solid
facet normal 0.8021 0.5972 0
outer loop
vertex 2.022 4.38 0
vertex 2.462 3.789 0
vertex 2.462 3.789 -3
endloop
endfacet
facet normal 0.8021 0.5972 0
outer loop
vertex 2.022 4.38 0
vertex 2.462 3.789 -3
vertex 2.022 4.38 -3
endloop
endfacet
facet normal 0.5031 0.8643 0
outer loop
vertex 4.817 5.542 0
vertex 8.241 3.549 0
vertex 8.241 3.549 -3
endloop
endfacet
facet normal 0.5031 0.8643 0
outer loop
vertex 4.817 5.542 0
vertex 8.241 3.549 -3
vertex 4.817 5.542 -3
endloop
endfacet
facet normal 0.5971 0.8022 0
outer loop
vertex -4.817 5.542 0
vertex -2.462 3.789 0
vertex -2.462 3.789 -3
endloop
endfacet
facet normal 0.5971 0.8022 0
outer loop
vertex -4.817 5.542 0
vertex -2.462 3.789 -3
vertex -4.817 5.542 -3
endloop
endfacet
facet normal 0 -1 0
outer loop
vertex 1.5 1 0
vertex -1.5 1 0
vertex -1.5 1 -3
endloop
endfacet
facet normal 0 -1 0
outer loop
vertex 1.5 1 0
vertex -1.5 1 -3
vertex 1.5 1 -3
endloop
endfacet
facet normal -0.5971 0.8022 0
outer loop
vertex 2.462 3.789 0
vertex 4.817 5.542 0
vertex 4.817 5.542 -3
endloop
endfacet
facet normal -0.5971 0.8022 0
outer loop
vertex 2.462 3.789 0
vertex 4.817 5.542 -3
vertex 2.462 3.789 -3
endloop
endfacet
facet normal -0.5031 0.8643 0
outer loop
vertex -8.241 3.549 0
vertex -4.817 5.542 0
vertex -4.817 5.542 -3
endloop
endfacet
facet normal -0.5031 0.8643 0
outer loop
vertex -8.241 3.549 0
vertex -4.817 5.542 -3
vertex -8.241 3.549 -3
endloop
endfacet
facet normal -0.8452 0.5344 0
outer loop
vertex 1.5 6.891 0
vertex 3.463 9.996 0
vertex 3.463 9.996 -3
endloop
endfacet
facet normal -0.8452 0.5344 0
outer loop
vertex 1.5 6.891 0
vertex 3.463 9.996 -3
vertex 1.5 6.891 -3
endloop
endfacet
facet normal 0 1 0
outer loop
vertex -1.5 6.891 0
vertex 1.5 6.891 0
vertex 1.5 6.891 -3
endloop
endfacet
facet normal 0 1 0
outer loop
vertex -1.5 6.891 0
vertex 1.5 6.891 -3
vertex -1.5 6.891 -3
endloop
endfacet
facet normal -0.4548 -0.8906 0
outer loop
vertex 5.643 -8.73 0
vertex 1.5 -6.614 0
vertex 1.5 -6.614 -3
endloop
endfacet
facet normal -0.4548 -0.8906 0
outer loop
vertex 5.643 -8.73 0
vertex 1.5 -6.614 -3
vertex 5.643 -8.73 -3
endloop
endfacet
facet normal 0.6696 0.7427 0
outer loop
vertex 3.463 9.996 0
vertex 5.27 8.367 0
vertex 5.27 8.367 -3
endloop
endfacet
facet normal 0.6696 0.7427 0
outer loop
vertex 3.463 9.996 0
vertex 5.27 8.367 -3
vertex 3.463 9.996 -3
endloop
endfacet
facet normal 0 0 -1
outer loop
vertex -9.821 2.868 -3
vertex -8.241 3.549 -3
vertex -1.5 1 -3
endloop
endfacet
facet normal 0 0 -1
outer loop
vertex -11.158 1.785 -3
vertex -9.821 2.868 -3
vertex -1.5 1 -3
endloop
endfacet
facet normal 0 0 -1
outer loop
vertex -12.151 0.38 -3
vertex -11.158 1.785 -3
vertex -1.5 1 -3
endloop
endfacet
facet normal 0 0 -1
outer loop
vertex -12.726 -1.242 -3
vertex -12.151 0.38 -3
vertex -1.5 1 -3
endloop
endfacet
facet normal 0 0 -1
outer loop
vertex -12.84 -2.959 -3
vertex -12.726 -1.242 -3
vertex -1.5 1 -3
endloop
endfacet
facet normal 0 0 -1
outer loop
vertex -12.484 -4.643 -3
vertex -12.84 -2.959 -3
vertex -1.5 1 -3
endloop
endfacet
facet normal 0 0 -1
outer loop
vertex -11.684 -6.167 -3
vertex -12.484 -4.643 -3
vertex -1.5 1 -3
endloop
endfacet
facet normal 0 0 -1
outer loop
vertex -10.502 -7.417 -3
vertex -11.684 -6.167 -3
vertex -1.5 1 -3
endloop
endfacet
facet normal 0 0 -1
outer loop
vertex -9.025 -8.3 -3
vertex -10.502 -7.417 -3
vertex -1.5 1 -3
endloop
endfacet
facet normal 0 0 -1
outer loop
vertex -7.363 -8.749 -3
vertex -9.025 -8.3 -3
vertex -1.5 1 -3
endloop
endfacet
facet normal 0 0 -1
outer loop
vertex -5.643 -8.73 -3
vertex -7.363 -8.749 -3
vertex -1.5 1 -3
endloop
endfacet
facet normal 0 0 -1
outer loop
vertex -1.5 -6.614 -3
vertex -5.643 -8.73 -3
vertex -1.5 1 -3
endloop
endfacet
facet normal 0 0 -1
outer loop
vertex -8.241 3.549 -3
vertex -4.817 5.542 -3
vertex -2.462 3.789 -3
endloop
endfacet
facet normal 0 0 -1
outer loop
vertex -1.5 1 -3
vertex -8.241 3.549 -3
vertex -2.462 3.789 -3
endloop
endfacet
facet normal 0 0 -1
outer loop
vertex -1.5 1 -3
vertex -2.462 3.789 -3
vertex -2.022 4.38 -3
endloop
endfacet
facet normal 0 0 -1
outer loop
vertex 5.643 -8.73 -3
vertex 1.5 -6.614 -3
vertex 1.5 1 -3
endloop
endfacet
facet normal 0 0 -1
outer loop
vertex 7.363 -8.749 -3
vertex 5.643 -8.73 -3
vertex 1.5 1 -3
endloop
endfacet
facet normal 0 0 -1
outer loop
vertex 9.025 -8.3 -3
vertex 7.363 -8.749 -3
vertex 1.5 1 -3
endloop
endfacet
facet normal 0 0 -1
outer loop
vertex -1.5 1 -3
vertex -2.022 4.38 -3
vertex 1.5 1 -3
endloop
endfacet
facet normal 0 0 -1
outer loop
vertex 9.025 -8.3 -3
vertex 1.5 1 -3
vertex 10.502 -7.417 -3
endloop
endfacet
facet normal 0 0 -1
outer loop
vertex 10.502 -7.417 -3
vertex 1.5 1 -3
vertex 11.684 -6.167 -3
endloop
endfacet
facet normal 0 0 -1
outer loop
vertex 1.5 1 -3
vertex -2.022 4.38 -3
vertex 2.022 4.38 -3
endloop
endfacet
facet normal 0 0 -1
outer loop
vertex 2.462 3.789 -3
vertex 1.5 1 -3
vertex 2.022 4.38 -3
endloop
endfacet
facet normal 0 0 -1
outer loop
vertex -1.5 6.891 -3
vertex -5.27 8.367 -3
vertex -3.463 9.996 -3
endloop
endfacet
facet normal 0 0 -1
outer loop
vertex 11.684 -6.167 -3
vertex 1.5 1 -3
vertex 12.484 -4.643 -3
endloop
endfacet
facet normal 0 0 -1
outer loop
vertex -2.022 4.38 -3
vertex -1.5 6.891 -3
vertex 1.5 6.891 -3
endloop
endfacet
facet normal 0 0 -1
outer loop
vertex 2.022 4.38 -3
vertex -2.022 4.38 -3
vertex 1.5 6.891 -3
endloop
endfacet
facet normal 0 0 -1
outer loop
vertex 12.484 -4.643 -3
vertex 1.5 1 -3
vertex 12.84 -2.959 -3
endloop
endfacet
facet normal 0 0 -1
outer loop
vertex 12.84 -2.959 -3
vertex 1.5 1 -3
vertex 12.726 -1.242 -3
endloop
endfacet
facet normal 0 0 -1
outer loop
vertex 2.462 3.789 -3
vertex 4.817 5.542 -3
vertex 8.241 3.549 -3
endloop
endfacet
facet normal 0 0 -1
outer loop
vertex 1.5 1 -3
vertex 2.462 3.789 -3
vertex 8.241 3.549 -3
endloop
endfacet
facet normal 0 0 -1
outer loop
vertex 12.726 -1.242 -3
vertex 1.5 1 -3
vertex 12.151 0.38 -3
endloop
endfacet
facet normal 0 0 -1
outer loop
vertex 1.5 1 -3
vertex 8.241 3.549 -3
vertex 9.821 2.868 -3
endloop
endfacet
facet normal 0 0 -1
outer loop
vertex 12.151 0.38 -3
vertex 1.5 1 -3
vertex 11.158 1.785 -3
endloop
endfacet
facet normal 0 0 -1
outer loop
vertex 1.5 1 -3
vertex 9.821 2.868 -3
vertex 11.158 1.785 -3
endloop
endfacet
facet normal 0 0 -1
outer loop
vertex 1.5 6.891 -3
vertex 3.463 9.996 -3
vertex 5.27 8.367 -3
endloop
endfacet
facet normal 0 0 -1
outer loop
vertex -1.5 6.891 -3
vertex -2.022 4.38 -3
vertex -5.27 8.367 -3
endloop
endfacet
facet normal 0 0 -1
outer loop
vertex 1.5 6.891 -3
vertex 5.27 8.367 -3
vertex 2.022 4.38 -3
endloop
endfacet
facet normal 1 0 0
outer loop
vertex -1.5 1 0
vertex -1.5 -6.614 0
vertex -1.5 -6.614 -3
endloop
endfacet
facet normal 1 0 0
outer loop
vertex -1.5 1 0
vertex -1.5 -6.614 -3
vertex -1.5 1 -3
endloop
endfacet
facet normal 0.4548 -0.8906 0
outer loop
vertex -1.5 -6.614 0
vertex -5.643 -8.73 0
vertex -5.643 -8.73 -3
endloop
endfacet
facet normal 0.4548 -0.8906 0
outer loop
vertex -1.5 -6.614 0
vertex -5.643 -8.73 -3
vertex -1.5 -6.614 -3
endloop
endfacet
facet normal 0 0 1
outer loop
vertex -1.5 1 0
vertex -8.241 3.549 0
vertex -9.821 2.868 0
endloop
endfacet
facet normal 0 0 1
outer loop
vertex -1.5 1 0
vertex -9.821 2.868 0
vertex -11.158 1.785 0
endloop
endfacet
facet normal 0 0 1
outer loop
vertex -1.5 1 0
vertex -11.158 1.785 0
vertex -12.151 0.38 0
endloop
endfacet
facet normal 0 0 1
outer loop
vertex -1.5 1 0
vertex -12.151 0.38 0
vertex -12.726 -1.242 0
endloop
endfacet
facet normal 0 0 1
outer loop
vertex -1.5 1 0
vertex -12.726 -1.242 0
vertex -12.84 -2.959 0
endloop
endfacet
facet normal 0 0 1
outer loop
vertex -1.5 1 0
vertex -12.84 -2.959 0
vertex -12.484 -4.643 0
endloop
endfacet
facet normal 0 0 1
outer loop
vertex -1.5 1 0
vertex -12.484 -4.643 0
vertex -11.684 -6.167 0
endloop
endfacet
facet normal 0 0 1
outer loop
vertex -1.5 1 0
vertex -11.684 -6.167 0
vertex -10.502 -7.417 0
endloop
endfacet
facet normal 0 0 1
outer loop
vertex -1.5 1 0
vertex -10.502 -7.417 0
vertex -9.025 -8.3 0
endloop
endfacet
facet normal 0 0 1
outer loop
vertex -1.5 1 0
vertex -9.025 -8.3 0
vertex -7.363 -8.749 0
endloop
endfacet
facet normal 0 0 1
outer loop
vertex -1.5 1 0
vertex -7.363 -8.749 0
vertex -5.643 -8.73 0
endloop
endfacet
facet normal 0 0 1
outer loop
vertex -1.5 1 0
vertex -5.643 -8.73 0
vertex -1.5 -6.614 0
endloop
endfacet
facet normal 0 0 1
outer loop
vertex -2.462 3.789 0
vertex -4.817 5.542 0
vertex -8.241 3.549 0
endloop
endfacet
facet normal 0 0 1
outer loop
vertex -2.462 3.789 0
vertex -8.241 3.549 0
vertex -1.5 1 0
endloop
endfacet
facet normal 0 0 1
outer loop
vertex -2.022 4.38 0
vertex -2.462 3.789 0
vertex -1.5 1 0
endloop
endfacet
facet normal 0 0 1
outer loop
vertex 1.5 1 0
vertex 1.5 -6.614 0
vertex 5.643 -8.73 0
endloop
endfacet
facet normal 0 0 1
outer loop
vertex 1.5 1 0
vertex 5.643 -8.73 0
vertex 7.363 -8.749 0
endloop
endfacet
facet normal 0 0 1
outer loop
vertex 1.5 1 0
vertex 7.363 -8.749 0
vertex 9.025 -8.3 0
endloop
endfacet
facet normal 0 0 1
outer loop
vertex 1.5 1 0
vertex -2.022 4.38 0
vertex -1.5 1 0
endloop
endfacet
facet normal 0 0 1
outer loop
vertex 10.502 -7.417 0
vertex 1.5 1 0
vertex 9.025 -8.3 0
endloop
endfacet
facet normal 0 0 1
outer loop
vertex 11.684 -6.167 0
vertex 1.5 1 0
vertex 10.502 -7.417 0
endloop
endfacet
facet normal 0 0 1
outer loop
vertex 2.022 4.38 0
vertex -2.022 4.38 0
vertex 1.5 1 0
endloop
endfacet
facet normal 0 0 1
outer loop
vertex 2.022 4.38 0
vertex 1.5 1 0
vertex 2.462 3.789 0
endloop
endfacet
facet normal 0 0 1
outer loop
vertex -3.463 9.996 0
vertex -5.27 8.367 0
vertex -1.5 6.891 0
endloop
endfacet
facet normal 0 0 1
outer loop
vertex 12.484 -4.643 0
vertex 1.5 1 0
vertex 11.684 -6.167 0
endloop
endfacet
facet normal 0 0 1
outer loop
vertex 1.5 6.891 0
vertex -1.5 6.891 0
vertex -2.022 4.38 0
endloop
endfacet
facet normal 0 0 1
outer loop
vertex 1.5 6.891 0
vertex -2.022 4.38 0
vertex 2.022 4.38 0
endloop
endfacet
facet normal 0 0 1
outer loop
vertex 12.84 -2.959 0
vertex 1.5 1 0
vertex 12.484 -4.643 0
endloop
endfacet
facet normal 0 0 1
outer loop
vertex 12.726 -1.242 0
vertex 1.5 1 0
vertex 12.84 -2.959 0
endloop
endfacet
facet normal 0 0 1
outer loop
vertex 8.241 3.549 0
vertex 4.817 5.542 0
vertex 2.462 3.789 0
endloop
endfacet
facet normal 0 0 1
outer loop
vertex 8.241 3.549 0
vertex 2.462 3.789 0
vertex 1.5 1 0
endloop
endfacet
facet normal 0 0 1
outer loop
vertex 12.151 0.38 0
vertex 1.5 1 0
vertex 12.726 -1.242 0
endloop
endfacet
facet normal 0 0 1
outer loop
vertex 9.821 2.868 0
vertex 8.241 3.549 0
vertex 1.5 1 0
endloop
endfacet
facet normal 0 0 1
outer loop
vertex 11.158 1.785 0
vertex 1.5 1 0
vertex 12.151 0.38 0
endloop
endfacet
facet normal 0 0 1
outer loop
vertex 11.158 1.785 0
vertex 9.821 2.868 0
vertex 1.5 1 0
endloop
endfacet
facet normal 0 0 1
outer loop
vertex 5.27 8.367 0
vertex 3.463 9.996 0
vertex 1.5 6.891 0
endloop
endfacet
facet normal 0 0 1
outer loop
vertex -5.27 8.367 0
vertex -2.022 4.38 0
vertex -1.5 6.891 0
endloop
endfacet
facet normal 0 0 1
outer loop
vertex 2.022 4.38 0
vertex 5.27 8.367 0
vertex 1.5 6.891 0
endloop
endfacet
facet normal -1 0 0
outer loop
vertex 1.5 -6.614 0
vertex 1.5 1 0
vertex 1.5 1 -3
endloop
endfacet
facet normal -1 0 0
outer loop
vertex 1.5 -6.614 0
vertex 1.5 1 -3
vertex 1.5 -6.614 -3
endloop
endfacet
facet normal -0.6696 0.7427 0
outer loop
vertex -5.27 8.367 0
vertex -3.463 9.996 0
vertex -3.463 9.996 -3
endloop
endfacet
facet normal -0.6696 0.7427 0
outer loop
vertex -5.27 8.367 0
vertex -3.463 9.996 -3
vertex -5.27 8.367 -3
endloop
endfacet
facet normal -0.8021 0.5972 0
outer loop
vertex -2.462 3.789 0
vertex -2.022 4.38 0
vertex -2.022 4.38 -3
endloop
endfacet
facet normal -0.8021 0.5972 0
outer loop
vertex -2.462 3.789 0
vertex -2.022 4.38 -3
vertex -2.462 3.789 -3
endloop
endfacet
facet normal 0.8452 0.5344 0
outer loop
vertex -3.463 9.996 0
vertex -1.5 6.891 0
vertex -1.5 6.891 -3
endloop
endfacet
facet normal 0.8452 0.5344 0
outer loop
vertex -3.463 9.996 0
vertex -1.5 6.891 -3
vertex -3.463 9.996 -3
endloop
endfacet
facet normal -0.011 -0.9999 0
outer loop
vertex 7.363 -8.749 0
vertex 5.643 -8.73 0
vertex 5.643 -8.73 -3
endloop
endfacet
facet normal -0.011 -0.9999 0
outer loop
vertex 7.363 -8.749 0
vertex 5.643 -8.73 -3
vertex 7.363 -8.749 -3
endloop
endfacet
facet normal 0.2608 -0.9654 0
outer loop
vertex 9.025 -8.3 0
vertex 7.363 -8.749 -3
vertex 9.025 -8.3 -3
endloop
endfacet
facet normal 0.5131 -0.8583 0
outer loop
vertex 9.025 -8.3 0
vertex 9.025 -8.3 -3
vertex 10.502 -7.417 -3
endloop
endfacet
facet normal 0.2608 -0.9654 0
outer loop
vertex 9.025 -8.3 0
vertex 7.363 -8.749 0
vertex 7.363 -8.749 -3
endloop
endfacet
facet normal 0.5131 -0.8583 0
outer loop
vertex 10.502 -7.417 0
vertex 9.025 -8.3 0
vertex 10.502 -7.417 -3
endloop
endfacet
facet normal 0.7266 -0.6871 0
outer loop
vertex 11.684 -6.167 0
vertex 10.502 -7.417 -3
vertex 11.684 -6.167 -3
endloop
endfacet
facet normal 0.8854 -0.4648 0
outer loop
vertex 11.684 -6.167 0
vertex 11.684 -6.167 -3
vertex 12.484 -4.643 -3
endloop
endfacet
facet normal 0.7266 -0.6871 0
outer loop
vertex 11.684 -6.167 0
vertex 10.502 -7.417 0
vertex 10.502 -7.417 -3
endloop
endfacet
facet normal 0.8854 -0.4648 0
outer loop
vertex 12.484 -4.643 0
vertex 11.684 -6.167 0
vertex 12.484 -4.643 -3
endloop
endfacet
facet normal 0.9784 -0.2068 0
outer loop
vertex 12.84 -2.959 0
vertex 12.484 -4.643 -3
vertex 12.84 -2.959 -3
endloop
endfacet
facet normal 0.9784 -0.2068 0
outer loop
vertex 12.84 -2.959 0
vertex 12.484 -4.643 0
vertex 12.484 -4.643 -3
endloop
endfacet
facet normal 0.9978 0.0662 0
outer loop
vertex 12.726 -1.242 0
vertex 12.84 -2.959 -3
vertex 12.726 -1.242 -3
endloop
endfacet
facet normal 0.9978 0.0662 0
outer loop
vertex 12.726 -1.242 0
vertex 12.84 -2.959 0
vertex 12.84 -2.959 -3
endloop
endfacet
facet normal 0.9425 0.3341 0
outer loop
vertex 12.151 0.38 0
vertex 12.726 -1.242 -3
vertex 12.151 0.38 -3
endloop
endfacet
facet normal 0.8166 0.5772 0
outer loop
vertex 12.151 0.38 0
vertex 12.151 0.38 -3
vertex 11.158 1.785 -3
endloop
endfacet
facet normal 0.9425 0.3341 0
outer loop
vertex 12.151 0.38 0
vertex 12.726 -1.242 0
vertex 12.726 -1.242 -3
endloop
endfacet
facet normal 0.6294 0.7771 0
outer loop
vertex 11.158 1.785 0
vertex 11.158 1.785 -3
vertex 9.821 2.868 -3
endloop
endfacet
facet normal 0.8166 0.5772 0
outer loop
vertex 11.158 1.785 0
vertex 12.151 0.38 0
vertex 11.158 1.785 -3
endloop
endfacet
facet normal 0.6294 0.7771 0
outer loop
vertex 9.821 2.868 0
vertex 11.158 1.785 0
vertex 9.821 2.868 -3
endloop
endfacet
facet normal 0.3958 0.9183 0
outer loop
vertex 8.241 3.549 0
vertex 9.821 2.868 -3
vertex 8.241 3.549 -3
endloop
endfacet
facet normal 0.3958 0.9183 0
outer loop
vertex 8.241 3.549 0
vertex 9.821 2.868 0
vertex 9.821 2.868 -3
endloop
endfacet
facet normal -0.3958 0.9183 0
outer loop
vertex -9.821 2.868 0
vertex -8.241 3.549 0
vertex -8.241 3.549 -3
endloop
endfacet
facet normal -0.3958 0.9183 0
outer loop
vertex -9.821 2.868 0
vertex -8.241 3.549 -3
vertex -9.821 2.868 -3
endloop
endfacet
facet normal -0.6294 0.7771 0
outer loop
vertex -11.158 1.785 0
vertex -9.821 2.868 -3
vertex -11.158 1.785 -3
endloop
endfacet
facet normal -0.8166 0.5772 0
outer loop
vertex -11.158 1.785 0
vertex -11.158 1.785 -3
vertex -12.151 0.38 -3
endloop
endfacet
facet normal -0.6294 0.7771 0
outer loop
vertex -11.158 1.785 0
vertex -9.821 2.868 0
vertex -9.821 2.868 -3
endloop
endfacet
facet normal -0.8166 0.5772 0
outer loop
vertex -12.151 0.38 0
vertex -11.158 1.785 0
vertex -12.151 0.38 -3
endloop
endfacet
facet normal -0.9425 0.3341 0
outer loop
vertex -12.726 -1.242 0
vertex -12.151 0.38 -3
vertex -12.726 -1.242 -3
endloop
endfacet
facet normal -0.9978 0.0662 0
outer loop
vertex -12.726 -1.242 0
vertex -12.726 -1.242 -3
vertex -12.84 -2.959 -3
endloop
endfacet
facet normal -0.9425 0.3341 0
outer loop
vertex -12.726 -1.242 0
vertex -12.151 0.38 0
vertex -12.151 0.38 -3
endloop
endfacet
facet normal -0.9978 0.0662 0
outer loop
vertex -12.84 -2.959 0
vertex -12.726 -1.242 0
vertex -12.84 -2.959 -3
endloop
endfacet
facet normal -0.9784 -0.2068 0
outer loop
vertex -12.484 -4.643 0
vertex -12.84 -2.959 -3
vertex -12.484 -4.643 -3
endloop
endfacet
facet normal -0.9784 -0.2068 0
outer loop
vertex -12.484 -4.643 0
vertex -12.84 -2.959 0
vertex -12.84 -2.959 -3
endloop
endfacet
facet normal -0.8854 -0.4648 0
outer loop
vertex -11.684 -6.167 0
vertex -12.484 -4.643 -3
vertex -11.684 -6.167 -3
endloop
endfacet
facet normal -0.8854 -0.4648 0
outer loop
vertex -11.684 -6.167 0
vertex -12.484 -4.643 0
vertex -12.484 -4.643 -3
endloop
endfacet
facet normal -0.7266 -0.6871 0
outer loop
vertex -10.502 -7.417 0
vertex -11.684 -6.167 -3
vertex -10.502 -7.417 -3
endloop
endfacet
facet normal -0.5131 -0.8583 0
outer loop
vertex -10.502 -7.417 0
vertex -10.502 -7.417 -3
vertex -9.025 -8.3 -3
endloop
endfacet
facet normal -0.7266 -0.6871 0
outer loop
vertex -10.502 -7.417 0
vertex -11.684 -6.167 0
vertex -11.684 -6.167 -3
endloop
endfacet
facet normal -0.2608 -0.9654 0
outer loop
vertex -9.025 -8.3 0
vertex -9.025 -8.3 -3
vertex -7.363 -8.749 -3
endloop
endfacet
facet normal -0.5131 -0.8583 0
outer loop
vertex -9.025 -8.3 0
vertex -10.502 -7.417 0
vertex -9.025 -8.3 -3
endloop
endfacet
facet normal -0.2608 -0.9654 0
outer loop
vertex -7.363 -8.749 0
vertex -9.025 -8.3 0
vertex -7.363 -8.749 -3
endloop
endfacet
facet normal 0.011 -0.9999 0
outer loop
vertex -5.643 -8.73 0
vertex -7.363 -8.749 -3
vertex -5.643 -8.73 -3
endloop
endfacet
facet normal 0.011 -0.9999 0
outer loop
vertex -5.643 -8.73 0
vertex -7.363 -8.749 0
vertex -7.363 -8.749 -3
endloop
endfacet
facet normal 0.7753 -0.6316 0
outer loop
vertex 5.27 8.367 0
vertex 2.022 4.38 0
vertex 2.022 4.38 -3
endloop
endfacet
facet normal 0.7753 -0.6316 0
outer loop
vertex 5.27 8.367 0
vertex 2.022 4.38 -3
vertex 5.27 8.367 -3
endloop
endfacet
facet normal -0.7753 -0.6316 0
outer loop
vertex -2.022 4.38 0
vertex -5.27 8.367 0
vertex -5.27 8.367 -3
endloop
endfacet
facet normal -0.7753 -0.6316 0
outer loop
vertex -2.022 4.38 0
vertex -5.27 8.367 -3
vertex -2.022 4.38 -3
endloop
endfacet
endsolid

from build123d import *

# Parameters (mm, degrees)
BOSS_EXTRUDE1_DEPTH = 3
SKETCH2_W           = 3
SKETCH2_H           = 1
CUT_EXTRUDE1_DEPTH  = 10


with BuildPart() as part:
    # Sketch1 → Boss-Extrude1 (new body)
    with BuildSketch(Plane.XY):
        with BuildLine():
            Line((1.5, 6.891), (-1.5, 6.891))
            Line((-1.5, 6.891), (-3.462838736, 9.995543944))
            Line((-3.462838736, 9.995543944), (-5.270057432, 8.366602698))
            Line((-5.270057432, 8.366602698), (-2.022319198, 4.380080358))
            Line((-2.022319198, 4.380080358), (-2.462490424, 3.788964217))
            Line((-2.462490424, 3.788964217), (-4.816528245, 5.541884903))
            Line((-4.816528245, 5.541884903), (-8.240611079, 3.54862106))
            ThreePointArc((-8.240611079, 3.54862106), (-12.719726234, -3.813407871), (-5.642674559, -8.730447848))
            Line((-5.642674559, -8.730447848), (-1.5, -6.614))
            Line((-1.5, -6.614), (-1.5, 0))
            Line((-1.5, 0), (1.5, 0))
            Line((1.5, 0), (1.5, -6.614))
            Line((1.5, -6.614), (5.642674559, -8.730447848))
            ThreePointArc((5.642674559, -8.730447848), (12.719726234, -3.813407871), (8.240611079, 3.54862106))
            Line((8.240611079, 3.54862106), (4.816528245, 5.541884903))
            Line((4.816528245, 5.541884903), (2.462490424, 3.788964217))
            Line((2.462490424, 3.788964217), (2.022319198, 4.380080358))
            Line((2.022319198, 4.380080358), (5.270057432, 8.366602698))
            Line((5.270057432, 8.366602698), (3.462838736, 9.995543944))
            Line((3.462838736, 9.995543944), (1.5, 6.891))
        make_face()
    extrude(amount=-BOSS_EXTRUDE1_DEPTH)

    # Sketch2 → Cut-Extrude1 (cut)
    with BuildSketch(Plane.XY):
        with Locations((0, 0.5)):
            Rectangle(SKETCH2_W, SKETCH2_H)
    extrude(amount=-CUT_EXTRUDE1_DEPTH, mode=Mode.SUBTRACT)


solid = part.part
